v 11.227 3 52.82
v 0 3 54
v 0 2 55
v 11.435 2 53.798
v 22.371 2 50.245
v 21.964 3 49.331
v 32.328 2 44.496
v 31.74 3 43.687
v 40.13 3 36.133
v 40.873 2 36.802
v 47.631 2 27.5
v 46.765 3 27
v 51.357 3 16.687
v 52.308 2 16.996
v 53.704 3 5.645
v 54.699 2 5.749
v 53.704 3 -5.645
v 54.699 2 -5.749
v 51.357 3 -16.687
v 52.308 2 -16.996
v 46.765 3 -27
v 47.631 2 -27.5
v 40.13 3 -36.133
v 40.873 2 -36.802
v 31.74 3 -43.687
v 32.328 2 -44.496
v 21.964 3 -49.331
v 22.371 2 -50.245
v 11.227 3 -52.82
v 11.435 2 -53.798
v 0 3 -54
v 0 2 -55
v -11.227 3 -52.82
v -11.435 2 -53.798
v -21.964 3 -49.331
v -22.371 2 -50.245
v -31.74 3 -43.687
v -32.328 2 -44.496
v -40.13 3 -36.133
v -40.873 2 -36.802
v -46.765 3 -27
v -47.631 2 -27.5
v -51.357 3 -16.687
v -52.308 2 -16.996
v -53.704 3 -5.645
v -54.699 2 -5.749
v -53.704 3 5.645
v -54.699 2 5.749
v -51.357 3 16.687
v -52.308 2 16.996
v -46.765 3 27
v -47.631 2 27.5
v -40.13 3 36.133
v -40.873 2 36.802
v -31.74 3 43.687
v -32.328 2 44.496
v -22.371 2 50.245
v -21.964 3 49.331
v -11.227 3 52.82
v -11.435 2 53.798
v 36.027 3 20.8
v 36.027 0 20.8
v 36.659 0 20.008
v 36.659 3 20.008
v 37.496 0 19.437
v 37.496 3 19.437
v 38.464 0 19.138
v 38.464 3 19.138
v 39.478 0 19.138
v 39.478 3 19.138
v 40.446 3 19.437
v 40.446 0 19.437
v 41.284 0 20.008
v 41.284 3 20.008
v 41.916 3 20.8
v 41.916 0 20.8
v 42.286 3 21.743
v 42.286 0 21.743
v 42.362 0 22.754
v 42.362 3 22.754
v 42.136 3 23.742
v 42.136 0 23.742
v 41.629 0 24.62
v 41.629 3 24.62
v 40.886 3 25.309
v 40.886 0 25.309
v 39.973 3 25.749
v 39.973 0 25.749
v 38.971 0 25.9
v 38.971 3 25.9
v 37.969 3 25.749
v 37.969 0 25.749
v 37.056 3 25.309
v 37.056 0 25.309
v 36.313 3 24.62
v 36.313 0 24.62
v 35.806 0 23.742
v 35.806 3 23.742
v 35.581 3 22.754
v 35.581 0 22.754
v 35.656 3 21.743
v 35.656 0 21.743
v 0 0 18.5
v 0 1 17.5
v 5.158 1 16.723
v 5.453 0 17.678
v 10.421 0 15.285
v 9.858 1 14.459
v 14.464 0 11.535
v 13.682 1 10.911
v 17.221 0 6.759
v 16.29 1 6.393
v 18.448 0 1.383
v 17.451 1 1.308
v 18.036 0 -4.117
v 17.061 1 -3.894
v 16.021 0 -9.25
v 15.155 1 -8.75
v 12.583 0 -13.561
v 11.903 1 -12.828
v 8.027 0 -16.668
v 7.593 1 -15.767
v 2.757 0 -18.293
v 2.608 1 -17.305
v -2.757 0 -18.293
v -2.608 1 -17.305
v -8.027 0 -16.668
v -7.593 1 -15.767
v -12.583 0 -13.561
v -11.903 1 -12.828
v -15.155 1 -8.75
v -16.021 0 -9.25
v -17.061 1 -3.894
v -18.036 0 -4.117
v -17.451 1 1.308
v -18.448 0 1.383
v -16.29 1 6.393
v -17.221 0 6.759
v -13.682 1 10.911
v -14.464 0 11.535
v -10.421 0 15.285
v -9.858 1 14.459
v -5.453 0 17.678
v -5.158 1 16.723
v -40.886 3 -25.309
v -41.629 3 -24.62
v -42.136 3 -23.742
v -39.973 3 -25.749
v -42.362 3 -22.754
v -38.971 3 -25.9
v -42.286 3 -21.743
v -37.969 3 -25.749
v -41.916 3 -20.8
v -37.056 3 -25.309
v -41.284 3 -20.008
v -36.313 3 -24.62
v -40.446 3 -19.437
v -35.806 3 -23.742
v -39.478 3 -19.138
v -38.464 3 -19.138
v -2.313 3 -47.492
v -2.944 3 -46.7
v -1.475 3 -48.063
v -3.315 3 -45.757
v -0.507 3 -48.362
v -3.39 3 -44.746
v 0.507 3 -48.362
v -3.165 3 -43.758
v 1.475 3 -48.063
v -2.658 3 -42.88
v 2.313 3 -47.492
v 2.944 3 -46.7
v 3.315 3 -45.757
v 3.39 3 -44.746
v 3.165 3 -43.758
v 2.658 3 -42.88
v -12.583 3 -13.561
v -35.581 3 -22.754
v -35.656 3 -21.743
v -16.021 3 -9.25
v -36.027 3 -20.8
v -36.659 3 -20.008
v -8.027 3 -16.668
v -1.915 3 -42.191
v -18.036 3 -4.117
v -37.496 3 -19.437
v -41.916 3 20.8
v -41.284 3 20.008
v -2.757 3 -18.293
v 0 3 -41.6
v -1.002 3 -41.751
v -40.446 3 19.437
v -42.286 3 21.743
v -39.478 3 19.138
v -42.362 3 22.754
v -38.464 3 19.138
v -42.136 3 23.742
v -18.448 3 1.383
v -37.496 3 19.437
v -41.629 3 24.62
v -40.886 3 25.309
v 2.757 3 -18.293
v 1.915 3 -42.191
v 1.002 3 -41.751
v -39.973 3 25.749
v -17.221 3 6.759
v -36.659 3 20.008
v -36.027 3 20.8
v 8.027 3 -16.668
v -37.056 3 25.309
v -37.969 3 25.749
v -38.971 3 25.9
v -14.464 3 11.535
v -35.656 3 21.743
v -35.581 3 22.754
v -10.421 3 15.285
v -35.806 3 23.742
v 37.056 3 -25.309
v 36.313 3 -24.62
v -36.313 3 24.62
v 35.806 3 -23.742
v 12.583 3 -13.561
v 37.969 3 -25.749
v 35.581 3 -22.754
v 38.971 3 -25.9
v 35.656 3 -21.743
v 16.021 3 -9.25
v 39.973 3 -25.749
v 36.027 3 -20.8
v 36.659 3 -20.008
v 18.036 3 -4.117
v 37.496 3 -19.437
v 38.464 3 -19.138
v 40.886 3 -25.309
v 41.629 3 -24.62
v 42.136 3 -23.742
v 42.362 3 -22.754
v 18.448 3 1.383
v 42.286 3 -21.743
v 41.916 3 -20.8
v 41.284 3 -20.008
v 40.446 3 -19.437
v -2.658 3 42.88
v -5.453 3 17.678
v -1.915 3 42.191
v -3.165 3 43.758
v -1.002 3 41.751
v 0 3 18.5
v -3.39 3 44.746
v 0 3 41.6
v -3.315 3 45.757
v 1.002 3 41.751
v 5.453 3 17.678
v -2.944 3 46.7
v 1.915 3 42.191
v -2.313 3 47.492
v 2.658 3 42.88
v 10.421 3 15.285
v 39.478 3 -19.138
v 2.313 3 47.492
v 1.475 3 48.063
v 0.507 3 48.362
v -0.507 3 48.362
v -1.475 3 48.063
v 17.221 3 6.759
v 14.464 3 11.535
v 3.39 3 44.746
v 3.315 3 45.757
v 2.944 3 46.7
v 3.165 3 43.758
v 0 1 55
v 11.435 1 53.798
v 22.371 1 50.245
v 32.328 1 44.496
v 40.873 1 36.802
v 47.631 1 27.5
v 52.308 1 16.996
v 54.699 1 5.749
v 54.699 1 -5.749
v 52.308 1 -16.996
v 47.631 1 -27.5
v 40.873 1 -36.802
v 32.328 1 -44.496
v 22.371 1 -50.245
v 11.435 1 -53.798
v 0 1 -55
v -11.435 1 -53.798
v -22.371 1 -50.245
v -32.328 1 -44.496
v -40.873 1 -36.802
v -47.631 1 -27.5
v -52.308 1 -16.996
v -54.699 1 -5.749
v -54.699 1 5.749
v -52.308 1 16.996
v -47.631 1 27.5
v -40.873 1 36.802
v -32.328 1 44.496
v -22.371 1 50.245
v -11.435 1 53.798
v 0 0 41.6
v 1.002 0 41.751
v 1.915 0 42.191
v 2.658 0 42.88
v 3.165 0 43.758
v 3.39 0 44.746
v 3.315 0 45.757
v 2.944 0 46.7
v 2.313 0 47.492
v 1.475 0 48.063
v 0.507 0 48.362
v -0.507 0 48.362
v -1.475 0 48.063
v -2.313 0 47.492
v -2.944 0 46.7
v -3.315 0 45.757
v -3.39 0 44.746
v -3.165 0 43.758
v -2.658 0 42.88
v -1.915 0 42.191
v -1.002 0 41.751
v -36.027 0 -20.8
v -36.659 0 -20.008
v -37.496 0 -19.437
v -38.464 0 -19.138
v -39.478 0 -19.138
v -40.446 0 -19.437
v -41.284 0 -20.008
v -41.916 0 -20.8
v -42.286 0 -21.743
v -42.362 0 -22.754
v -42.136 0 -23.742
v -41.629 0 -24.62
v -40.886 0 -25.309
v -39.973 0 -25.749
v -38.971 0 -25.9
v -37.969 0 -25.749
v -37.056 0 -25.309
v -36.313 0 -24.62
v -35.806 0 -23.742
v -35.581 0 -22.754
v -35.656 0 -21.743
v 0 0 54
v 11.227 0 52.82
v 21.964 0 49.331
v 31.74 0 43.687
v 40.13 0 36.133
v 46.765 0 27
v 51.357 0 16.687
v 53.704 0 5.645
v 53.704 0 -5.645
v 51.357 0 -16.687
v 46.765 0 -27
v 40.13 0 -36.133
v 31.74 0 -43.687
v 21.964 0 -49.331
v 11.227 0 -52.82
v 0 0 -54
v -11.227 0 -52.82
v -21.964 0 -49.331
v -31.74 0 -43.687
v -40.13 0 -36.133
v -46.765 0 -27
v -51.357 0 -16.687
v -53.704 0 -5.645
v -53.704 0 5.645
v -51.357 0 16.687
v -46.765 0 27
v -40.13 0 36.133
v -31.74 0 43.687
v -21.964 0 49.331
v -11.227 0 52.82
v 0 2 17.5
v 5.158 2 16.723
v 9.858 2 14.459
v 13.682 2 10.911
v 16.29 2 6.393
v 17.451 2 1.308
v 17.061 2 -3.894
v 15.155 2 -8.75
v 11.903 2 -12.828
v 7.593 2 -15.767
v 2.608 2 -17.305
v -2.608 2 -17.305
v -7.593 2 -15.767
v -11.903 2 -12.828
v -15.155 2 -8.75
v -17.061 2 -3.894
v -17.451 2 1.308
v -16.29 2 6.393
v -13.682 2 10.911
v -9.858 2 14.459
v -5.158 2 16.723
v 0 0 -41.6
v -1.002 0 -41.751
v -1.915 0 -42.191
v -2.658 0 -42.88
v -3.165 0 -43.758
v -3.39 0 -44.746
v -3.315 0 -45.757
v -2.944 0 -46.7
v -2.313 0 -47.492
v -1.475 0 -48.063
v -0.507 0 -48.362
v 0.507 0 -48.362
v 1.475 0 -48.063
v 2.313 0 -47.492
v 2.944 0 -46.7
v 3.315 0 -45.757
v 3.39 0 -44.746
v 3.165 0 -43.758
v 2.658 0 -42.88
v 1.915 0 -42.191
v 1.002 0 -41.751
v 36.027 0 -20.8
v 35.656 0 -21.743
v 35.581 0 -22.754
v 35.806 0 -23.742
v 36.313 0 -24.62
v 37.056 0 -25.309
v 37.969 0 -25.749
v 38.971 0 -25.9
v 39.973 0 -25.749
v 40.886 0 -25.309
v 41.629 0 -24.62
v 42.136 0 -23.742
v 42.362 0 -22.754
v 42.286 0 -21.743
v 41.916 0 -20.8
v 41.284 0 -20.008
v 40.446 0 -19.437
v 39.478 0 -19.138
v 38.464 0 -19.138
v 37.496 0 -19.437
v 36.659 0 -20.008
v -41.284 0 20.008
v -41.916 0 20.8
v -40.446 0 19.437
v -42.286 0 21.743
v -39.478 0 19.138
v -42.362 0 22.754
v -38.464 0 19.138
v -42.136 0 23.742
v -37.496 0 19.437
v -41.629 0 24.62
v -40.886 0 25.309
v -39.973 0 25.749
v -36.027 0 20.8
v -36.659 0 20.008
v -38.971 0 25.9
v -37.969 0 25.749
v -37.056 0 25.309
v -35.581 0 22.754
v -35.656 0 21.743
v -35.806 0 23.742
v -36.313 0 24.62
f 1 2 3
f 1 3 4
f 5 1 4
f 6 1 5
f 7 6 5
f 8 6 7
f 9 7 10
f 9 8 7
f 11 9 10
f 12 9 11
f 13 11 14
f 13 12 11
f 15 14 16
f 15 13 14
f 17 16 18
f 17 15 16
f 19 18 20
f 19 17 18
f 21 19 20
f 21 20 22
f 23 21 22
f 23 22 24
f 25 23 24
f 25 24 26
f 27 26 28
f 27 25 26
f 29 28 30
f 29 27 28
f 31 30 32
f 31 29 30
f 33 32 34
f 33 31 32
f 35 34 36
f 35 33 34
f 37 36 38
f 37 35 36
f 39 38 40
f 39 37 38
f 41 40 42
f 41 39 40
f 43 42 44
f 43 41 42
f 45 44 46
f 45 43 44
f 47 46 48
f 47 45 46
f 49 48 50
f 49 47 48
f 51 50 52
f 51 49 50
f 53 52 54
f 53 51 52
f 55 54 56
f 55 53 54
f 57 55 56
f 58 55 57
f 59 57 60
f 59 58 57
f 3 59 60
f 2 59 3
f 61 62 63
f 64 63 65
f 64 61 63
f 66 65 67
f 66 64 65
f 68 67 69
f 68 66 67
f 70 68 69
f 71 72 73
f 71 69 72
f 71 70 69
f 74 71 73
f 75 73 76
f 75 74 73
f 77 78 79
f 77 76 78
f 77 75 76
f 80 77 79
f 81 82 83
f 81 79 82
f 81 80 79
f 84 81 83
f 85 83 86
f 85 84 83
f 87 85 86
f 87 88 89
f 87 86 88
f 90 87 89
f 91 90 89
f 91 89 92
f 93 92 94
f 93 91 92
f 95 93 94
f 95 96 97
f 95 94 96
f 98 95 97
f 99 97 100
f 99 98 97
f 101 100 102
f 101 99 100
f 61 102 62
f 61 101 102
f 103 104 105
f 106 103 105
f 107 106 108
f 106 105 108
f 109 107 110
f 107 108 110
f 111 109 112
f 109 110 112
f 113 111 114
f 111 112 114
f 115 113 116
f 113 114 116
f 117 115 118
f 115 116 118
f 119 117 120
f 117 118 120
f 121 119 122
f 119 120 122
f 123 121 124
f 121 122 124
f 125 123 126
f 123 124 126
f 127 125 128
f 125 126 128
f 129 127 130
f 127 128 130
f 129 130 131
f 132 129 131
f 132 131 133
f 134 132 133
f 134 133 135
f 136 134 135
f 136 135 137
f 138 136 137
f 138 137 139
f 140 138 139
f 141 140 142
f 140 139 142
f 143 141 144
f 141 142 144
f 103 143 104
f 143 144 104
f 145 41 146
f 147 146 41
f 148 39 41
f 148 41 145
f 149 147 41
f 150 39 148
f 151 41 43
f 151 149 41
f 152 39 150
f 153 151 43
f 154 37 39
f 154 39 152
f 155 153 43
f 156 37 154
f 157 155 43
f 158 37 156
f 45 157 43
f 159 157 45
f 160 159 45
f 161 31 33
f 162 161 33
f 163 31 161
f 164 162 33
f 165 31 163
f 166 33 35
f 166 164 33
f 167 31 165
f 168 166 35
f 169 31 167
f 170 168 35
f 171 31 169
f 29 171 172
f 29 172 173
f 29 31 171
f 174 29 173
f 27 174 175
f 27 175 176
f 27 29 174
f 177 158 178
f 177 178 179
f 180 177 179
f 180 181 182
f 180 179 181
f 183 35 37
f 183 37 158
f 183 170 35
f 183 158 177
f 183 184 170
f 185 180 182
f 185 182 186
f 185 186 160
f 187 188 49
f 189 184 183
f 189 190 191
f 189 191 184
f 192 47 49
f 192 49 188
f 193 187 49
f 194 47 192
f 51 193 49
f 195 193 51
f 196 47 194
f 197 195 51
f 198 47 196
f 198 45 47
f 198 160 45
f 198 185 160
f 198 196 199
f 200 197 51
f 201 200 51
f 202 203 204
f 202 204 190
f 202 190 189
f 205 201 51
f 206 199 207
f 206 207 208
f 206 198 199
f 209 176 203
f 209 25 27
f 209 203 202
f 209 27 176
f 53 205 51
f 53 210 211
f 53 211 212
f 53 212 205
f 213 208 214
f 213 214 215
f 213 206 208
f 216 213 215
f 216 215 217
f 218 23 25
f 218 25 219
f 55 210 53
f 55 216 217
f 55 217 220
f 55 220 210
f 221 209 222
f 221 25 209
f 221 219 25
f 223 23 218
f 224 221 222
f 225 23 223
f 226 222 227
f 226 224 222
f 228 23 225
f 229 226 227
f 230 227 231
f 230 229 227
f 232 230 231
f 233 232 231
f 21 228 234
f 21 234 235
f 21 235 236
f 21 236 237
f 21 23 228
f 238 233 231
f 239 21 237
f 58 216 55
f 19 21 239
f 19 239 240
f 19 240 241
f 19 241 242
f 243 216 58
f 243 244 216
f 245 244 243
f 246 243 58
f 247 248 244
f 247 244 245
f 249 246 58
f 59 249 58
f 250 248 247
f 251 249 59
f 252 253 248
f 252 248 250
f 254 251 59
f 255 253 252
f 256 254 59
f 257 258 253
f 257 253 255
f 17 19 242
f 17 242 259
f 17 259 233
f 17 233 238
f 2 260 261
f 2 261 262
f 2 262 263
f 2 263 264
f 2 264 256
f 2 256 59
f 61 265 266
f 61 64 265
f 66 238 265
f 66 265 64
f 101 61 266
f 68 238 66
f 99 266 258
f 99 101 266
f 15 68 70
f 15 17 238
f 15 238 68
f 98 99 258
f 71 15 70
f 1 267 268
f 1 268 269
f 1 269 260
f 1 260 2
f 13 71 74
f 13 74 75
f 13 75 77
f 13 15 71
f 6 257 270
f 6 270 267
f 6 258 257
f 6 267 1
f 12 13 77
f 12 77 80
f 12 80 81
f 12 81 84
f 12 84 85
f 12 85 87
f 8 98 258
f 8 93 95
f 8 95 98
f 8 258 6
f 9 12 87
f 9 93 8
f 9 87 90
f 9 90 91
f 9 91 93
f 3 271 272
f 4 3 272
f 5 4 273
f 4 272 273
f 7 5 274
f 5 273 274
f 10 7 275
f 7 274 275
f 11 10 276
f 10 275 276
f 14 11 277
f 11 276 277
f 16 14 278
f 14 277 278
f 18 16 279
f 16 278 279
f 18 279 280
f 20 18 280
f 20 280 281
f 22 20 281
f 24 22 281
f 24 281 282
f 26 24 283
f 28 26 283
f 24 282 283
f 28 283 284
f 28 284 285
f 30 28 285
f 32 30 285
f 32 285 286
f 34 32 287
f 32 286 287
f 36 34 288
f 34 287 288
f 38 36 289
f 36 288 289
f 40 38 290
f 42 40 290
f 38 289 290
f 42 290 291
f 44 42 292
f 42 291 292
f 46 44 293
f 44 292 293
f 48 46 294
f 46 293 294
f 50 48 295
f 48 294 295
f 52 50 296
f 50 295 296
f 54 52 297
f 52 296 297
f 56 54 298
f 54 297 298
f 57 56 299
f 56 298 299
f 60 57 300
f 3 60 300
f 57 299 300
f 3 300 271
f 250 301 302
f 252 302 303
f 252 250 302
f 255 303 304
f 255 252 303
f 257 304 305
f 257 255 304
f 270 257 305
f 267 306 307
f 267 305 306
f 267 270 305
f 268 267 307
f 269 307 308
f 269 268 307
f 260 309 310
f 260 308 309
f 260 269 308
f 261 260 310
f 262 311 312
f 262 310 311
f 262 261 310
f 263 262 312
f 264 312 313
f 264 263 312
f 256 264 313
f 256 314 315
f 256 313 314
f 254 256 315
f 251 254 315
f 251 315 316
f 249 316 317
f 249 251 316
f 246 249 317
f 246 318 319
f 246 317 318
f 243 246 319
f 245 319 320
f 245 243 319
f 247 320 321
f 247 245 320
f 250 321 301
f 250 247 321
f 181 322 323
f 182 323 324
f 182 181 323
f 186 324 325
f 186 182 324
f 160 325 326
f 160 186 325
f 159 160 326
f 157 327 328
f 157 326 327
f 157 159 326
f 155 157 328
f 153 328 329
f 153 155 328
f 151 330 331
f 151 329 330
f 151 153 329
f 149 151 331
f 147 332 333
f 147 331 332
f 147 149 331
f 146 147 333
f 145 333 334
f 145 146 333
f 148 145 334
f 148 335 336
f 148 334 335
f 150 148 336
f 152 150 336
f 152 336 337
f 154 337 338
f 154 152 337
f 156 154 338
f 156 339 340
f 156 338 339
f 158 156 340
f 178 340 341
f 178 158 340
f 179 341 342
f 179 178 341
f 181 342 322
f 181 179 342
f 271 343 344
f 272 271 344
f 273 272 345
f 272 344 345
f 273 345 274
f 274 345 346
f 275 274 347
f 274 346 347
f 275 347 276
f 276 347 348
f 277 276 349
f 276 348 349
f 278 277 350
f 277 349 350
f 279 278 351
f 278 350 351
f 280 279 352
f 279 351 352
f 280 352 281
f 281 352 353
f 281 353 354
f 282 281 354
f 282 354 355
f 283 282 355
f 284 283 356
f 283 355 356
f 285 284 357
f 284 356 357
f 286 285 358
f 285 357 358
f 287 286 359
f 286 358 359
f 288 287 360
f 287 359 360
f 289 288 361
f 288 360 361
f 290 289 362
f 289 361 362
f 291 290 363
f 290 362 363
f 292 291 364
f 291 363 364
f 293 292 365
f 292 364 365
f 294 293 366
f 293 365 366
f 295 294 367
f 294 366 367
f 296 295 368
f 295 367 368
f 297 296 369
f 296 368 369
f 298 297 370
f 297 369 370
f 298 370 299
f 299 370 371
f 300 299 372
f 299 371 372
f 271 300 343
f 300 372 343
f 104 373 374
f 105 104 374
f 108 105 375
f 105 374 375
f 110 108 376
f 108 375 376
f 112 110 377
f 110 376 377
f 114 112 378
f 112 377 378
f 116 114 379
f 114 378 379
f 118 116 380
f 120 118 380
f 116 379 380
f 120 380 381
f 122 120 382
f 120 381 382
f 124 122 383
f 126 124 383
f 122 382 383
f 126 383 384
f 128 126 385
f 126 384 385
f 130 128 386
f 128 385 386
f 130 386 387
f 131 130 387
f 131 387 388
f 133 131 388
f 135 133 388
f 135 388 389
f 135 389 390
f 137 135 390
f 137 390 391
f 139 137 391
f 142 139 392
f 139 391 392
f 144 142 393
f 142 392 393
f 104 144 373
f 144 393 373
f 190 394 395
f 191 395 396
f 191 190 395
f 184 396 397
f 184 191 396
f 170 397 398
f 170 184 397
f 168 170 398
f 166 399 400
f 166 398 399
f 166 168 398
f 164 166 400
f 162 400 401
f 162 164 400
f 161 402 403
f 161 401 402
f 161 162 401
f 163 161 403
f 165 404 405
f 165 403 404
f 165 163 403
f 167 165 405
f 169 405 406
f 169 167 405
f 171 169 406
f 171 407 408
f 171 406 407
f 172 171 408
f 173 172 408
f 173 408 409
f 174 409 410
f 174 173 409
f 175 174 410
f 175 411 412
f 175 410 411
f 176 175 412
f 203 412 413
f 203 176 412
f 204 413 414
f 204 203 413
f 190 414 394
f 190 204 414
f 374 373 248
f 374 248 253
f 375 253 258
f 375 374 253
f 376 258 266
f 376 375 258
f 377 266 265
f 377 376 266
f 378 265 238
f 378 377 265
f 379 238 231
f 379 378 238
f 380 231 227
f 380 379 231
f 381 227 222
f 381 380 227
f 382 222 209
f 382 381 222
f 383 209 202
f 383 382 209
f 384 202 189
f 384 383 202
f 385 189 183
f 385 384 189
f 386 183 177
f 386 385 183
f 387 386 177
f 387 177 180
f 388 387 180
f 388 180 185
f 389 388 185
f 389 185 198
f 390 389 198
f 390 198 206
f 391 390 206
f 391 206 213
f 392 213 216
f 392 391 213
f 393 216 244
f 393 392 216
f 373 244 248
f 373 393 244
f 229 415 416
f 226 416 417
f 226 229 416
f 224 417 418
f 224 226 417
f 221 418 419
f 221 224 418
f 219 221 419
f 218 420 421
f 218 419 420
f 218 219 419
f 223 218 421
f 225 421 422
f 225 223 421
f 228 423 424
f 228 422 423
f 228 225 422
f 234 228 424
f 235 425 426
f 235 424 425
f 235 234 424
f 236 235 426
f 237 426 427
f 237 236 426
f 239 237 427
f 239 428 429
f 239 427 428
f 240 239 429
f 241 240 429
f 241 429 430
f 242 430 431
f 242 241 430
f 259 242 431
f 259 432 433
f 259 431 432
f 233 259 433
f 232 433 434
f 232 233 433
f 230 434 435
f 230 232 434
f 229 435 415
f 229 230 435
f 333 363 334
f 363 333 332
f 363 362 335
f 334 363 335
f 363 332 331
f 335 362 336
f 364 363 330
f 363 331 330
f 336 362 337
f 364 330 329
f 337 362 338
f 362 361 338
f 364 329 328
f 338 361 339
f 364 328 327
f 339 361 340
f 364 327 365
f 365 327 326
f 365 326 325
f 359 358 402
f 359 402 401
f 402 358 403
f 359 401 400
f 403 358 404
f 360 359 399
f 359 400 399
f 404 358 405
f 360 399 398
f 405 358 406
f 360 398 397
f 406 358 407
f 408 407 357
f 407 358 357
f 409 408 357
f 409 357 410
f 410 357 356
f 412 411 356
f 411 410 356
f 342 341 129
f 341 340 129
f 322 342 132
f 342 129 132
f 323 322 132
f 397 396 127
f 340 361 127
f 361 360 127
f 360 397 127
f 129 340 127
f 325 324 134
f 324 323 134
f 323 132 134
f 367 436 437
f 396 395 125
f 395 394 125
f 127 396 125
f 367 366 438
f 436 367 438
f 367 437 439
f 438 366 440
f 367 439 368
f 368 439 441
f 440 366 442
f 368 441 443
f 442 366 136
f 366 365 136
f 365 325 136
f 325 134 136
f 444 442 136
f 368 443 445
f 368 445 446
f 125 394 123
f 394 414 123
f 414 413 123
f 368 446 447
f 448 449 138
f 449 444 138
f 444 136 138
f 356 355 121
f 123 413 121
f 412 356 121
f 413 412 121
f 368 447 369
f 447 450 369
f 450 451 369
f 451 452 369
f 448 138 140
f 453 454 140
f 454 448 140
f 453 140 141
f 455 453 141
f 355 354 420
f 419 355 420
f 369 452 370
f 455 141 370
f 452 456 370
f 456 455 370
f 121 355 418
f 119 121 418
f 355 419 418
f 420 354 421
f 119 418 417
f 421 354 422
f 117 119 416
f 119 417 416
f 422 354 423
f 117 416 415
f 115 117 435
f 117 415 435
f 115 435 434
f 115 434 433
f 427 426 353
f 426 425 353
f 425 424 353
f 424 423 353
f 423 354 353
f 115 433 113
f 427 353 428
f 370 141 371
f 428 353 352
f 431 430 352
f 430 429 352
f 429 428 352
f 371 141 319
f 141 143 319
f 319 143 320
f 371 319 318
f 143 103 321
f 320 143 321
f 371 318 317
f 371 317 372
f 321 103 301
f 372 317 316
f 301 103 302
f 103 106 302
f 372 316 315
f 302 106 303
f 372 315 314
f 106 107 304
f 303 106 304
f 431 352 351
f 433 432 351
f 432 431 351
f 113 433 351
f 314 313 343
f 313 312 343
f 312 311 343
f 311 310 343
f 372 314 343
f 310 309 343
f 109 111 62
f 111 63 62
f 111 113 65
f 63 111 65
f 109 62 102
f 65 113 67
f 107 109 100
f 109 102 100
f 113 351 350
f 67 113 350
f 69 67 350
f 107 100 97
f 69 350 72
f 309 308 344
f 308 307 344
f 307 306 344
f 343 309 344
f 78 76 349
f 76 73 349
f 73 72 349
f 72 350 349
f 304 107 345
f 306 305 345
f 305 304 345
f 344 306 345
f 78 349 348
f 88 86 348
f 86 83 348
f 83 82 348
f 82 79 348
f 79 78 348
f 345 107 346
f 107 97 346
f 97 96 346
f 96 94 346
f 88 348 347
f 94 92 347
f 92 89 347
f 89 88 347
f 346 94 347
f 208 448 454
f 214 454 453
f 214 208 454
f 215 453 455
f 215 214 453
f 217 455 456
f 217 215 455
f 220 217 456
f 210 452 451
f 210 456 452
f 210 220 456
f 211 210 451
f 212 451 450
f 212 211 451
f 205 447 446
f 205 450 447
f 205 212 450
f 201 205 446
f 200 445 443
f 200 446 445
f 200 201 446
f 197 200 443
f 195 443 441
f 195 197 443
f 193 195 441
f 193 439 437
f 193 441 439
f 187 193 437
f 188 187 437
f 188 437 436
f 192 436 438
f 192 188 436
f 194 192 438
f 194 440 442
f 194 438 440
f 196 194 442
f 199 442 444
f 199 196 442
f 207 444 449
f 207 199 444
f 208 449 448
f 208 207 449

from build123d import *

# Parameters (mm, degrees)
SKETCH_1_R               = 55
EXTRUDE_1_DEPTH          = 3
PATTERN_CIRCULAR_1_COUNT = 6
SKETCH_2_R               = 17.5
CUT_EXTRUDE_1_DEPTH      = 3
CHAMFER_1_SIZE           = 1
CHAMFER_2_SIZE           = 1


with BuildPart() as part:
    # 草图1 → 凸台-拉伸1 (new body)
    with BuildSketch(Plane(origin=(0, 0, 0), x_dir=(1, 0, 0), z_dir=(0, 1, 0))):
        with Locations(Location((0, 0, 0), (0, 0, 270))):
            Circle(SKETCH_1_R)
    extrude(amount=EXTRUDE_1_DEPTH)

    # 草图4 → M8 螺纹孔的螺纹孔钻头1 (revolve, cut)
    with BuildSketch(Plane(origin=(0, 3, -45), x_dir=(0, 0, 1), z_dir=(1, 0, 0))):
        Polygon((0, 0), (0, 18.042926105), (3.4, 16), (3.4, 0), align=None)
    hole_wizard_m8_1 = revolve(axis=Axis((0, 9.35, -45), (0, -1, 0)), mode=Mode.SUBTRACT)

    # 阵列(圆周)1: M8 螺纹孔的螺纹孔钻头1 ×6 about axis
    pattern_circular_1_axis = Axis((0, 0, 0), (0, 1, 0))
    for i in range(1, PATTERN_CIRCULAR_1_COUNT):
        add(hole_wizard_m8_1.rotate(pattern_circular_1_axis, i * 360 / PATTERN_CIRCULAR_1_COUNT), mode=Mode.SUBTRACT)

    # 草图2 → 切除-拉伸1 (cut)
    with BuildSketch(Plane(origin=(0, 3, 0), x_dir=(1, 0, 0), z_dir=(0, 1, 0))):
        with Locations(Location((0, 0, 0), (0, 0, 270))):
            Circle(SKETCH_2_R)
    extrude(amount=-CUT_EXTRUDE_1_DEPTH, mode=Mode.SUBTRACT)

    # 倒角1
    chamfer_1_edges = [part.edges().sort_by_distance(p)[0] for p in [
        (0, 0, -55),
        (0, 3, -55),
    ]]
    chamfer(chamfer_1_edges, length=CHAMFER_1_SIZE)

    # 倒角2
    chamfer_2_edges = [part.edges().sort_by_distance(p)[0] for p in [
        (0, 0, -17.5),
        (0, 3, -17.5),
    ]]
    chamfer(chamfer_2_edges, length=CHAMFER_2_SIZE)


solid = part.part
